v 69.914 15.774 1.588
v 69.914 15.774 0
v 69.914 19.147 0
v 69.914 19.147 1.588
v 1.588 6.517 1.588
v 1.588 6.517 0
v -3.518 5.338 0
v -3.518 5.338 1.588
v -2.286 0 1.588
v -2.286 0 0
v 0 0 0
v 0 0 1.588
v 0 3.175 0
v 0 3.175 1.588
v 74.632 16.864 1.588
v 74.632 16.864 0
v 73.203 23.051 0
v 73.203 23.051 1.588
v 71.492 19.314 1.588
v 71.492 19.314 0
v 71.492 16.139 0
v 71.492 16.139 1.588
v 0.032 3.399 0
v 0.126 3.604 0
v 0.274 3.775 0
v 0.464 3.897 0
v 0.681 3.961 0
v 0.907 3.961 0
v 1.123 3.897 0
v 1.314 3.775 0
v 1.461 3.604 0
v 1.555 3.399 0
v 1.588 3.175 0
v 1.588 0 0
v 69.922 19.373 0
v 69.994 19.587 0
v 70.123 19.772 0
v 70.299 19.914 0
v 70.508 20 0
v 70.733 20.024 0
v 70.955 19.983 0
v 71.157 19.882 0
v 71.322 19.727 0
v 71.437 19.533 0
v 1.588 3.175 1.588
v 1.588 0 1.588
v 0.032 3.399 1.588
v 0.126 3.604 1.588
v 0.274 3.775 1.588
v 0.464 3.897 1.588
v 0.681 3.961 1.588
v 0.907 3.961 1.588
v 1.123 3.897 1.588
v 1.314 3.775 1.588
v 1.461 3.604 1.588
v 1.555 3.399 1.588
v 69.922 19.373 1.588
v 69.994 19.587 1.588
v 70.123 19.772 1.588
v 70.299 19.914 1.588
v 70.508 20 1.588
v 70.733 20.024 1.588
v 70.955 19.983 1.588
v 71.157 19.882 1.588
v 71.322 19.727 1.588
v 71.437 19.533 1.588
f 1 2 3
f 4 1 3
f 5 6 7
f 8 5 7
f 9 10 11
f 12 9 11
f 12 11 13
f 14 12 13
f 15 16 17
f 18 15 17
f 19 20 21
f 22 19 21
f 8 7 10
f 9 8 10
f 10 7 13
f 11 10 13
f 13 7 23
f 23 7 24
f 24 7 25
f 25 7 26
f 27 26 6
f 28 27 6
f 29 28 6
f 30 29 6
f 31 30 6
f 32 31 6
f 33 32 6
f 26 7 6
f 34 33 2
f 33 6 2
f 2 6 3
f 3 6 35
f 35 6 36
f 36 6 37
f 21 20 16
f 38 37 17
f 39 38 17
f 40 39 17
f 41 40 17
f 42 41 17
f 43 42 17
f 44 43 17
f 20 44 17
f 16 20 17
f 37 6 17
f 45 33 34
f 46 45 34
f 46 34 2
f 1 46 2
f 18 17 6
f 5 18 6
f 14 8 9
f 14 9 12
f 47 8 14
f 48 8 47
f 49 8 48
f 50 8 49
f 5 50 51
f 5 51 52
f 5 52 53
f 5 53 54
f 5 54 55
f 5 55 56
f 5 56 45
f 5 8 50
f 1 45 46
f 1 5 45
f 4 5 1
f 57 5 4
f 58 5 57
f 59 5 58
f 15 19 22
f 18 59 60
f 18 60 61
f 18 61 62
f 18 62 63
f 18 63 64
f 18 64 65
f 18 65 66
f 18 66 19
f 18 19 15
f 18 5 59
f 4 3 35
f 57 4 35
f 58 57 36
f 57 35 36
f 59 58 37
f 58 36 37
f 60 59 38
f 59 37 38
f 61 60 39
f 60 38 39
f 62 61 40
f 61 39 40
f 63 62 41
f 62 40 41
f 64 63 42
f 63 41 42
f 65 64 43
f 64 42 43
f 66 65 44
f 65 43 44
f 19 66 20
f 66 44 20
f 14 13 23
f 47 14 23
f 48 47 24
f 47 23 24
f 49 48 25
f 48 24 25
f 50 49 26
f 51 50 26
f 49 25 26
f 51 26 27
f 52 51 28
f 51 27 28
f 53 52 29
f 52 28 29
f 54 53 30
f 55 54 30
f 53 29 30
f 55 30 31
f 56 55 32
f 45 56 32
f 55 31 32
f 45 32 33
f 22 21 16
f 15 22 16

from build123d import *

# Parameters (mm, degrees)
BOSS_EXTRUDE1_DEPTH = 1.5875


with BuildPart() as part:
    # Sketch1 → Boss-Extrude1 (new body)
    with BuildSketch(Plane.XY):
        with BuildLine():
            Line((0, 0), (0, 3.175))
            ThreePointArc((0, 3.175), (0.79375, 3.96875), (1.5875, 3.175))
            Line((1.5875, 3.175), (1.5875, 0))
            Line((1.5875, 0), (69.9135, 15.774300027))
            Line((69.9135, 15.774300027), (69.9135, 19.146896146))
            ThreePointArc((69.9135, 19.146896146), (70.619414052, 20.019686772), (71.492204678, 19.31377272))
            Line((71.492204678, 19.31377272), (71.492204678, 16.13877272))
            Line((71.492204678, 16.13877272), (74.631909532, 16.8636307))
            Line((74.631909532, 16.8636307), (73.203470337, 23.050880612))
            Line((73.203470337, 23.050880612), (1.5875, 6.517031084))
            Line((1.5875, 6.517031084), (-3.518428564, 5.338234593))
            Line((-3.518428564, 5.338234593), (-2.286, 0))
            Line((-2.286, 0), (0, 0))
        make_face()
    extrude(amount=BOSS_EXTRUDE1_DEPTH)


solid = part.part
